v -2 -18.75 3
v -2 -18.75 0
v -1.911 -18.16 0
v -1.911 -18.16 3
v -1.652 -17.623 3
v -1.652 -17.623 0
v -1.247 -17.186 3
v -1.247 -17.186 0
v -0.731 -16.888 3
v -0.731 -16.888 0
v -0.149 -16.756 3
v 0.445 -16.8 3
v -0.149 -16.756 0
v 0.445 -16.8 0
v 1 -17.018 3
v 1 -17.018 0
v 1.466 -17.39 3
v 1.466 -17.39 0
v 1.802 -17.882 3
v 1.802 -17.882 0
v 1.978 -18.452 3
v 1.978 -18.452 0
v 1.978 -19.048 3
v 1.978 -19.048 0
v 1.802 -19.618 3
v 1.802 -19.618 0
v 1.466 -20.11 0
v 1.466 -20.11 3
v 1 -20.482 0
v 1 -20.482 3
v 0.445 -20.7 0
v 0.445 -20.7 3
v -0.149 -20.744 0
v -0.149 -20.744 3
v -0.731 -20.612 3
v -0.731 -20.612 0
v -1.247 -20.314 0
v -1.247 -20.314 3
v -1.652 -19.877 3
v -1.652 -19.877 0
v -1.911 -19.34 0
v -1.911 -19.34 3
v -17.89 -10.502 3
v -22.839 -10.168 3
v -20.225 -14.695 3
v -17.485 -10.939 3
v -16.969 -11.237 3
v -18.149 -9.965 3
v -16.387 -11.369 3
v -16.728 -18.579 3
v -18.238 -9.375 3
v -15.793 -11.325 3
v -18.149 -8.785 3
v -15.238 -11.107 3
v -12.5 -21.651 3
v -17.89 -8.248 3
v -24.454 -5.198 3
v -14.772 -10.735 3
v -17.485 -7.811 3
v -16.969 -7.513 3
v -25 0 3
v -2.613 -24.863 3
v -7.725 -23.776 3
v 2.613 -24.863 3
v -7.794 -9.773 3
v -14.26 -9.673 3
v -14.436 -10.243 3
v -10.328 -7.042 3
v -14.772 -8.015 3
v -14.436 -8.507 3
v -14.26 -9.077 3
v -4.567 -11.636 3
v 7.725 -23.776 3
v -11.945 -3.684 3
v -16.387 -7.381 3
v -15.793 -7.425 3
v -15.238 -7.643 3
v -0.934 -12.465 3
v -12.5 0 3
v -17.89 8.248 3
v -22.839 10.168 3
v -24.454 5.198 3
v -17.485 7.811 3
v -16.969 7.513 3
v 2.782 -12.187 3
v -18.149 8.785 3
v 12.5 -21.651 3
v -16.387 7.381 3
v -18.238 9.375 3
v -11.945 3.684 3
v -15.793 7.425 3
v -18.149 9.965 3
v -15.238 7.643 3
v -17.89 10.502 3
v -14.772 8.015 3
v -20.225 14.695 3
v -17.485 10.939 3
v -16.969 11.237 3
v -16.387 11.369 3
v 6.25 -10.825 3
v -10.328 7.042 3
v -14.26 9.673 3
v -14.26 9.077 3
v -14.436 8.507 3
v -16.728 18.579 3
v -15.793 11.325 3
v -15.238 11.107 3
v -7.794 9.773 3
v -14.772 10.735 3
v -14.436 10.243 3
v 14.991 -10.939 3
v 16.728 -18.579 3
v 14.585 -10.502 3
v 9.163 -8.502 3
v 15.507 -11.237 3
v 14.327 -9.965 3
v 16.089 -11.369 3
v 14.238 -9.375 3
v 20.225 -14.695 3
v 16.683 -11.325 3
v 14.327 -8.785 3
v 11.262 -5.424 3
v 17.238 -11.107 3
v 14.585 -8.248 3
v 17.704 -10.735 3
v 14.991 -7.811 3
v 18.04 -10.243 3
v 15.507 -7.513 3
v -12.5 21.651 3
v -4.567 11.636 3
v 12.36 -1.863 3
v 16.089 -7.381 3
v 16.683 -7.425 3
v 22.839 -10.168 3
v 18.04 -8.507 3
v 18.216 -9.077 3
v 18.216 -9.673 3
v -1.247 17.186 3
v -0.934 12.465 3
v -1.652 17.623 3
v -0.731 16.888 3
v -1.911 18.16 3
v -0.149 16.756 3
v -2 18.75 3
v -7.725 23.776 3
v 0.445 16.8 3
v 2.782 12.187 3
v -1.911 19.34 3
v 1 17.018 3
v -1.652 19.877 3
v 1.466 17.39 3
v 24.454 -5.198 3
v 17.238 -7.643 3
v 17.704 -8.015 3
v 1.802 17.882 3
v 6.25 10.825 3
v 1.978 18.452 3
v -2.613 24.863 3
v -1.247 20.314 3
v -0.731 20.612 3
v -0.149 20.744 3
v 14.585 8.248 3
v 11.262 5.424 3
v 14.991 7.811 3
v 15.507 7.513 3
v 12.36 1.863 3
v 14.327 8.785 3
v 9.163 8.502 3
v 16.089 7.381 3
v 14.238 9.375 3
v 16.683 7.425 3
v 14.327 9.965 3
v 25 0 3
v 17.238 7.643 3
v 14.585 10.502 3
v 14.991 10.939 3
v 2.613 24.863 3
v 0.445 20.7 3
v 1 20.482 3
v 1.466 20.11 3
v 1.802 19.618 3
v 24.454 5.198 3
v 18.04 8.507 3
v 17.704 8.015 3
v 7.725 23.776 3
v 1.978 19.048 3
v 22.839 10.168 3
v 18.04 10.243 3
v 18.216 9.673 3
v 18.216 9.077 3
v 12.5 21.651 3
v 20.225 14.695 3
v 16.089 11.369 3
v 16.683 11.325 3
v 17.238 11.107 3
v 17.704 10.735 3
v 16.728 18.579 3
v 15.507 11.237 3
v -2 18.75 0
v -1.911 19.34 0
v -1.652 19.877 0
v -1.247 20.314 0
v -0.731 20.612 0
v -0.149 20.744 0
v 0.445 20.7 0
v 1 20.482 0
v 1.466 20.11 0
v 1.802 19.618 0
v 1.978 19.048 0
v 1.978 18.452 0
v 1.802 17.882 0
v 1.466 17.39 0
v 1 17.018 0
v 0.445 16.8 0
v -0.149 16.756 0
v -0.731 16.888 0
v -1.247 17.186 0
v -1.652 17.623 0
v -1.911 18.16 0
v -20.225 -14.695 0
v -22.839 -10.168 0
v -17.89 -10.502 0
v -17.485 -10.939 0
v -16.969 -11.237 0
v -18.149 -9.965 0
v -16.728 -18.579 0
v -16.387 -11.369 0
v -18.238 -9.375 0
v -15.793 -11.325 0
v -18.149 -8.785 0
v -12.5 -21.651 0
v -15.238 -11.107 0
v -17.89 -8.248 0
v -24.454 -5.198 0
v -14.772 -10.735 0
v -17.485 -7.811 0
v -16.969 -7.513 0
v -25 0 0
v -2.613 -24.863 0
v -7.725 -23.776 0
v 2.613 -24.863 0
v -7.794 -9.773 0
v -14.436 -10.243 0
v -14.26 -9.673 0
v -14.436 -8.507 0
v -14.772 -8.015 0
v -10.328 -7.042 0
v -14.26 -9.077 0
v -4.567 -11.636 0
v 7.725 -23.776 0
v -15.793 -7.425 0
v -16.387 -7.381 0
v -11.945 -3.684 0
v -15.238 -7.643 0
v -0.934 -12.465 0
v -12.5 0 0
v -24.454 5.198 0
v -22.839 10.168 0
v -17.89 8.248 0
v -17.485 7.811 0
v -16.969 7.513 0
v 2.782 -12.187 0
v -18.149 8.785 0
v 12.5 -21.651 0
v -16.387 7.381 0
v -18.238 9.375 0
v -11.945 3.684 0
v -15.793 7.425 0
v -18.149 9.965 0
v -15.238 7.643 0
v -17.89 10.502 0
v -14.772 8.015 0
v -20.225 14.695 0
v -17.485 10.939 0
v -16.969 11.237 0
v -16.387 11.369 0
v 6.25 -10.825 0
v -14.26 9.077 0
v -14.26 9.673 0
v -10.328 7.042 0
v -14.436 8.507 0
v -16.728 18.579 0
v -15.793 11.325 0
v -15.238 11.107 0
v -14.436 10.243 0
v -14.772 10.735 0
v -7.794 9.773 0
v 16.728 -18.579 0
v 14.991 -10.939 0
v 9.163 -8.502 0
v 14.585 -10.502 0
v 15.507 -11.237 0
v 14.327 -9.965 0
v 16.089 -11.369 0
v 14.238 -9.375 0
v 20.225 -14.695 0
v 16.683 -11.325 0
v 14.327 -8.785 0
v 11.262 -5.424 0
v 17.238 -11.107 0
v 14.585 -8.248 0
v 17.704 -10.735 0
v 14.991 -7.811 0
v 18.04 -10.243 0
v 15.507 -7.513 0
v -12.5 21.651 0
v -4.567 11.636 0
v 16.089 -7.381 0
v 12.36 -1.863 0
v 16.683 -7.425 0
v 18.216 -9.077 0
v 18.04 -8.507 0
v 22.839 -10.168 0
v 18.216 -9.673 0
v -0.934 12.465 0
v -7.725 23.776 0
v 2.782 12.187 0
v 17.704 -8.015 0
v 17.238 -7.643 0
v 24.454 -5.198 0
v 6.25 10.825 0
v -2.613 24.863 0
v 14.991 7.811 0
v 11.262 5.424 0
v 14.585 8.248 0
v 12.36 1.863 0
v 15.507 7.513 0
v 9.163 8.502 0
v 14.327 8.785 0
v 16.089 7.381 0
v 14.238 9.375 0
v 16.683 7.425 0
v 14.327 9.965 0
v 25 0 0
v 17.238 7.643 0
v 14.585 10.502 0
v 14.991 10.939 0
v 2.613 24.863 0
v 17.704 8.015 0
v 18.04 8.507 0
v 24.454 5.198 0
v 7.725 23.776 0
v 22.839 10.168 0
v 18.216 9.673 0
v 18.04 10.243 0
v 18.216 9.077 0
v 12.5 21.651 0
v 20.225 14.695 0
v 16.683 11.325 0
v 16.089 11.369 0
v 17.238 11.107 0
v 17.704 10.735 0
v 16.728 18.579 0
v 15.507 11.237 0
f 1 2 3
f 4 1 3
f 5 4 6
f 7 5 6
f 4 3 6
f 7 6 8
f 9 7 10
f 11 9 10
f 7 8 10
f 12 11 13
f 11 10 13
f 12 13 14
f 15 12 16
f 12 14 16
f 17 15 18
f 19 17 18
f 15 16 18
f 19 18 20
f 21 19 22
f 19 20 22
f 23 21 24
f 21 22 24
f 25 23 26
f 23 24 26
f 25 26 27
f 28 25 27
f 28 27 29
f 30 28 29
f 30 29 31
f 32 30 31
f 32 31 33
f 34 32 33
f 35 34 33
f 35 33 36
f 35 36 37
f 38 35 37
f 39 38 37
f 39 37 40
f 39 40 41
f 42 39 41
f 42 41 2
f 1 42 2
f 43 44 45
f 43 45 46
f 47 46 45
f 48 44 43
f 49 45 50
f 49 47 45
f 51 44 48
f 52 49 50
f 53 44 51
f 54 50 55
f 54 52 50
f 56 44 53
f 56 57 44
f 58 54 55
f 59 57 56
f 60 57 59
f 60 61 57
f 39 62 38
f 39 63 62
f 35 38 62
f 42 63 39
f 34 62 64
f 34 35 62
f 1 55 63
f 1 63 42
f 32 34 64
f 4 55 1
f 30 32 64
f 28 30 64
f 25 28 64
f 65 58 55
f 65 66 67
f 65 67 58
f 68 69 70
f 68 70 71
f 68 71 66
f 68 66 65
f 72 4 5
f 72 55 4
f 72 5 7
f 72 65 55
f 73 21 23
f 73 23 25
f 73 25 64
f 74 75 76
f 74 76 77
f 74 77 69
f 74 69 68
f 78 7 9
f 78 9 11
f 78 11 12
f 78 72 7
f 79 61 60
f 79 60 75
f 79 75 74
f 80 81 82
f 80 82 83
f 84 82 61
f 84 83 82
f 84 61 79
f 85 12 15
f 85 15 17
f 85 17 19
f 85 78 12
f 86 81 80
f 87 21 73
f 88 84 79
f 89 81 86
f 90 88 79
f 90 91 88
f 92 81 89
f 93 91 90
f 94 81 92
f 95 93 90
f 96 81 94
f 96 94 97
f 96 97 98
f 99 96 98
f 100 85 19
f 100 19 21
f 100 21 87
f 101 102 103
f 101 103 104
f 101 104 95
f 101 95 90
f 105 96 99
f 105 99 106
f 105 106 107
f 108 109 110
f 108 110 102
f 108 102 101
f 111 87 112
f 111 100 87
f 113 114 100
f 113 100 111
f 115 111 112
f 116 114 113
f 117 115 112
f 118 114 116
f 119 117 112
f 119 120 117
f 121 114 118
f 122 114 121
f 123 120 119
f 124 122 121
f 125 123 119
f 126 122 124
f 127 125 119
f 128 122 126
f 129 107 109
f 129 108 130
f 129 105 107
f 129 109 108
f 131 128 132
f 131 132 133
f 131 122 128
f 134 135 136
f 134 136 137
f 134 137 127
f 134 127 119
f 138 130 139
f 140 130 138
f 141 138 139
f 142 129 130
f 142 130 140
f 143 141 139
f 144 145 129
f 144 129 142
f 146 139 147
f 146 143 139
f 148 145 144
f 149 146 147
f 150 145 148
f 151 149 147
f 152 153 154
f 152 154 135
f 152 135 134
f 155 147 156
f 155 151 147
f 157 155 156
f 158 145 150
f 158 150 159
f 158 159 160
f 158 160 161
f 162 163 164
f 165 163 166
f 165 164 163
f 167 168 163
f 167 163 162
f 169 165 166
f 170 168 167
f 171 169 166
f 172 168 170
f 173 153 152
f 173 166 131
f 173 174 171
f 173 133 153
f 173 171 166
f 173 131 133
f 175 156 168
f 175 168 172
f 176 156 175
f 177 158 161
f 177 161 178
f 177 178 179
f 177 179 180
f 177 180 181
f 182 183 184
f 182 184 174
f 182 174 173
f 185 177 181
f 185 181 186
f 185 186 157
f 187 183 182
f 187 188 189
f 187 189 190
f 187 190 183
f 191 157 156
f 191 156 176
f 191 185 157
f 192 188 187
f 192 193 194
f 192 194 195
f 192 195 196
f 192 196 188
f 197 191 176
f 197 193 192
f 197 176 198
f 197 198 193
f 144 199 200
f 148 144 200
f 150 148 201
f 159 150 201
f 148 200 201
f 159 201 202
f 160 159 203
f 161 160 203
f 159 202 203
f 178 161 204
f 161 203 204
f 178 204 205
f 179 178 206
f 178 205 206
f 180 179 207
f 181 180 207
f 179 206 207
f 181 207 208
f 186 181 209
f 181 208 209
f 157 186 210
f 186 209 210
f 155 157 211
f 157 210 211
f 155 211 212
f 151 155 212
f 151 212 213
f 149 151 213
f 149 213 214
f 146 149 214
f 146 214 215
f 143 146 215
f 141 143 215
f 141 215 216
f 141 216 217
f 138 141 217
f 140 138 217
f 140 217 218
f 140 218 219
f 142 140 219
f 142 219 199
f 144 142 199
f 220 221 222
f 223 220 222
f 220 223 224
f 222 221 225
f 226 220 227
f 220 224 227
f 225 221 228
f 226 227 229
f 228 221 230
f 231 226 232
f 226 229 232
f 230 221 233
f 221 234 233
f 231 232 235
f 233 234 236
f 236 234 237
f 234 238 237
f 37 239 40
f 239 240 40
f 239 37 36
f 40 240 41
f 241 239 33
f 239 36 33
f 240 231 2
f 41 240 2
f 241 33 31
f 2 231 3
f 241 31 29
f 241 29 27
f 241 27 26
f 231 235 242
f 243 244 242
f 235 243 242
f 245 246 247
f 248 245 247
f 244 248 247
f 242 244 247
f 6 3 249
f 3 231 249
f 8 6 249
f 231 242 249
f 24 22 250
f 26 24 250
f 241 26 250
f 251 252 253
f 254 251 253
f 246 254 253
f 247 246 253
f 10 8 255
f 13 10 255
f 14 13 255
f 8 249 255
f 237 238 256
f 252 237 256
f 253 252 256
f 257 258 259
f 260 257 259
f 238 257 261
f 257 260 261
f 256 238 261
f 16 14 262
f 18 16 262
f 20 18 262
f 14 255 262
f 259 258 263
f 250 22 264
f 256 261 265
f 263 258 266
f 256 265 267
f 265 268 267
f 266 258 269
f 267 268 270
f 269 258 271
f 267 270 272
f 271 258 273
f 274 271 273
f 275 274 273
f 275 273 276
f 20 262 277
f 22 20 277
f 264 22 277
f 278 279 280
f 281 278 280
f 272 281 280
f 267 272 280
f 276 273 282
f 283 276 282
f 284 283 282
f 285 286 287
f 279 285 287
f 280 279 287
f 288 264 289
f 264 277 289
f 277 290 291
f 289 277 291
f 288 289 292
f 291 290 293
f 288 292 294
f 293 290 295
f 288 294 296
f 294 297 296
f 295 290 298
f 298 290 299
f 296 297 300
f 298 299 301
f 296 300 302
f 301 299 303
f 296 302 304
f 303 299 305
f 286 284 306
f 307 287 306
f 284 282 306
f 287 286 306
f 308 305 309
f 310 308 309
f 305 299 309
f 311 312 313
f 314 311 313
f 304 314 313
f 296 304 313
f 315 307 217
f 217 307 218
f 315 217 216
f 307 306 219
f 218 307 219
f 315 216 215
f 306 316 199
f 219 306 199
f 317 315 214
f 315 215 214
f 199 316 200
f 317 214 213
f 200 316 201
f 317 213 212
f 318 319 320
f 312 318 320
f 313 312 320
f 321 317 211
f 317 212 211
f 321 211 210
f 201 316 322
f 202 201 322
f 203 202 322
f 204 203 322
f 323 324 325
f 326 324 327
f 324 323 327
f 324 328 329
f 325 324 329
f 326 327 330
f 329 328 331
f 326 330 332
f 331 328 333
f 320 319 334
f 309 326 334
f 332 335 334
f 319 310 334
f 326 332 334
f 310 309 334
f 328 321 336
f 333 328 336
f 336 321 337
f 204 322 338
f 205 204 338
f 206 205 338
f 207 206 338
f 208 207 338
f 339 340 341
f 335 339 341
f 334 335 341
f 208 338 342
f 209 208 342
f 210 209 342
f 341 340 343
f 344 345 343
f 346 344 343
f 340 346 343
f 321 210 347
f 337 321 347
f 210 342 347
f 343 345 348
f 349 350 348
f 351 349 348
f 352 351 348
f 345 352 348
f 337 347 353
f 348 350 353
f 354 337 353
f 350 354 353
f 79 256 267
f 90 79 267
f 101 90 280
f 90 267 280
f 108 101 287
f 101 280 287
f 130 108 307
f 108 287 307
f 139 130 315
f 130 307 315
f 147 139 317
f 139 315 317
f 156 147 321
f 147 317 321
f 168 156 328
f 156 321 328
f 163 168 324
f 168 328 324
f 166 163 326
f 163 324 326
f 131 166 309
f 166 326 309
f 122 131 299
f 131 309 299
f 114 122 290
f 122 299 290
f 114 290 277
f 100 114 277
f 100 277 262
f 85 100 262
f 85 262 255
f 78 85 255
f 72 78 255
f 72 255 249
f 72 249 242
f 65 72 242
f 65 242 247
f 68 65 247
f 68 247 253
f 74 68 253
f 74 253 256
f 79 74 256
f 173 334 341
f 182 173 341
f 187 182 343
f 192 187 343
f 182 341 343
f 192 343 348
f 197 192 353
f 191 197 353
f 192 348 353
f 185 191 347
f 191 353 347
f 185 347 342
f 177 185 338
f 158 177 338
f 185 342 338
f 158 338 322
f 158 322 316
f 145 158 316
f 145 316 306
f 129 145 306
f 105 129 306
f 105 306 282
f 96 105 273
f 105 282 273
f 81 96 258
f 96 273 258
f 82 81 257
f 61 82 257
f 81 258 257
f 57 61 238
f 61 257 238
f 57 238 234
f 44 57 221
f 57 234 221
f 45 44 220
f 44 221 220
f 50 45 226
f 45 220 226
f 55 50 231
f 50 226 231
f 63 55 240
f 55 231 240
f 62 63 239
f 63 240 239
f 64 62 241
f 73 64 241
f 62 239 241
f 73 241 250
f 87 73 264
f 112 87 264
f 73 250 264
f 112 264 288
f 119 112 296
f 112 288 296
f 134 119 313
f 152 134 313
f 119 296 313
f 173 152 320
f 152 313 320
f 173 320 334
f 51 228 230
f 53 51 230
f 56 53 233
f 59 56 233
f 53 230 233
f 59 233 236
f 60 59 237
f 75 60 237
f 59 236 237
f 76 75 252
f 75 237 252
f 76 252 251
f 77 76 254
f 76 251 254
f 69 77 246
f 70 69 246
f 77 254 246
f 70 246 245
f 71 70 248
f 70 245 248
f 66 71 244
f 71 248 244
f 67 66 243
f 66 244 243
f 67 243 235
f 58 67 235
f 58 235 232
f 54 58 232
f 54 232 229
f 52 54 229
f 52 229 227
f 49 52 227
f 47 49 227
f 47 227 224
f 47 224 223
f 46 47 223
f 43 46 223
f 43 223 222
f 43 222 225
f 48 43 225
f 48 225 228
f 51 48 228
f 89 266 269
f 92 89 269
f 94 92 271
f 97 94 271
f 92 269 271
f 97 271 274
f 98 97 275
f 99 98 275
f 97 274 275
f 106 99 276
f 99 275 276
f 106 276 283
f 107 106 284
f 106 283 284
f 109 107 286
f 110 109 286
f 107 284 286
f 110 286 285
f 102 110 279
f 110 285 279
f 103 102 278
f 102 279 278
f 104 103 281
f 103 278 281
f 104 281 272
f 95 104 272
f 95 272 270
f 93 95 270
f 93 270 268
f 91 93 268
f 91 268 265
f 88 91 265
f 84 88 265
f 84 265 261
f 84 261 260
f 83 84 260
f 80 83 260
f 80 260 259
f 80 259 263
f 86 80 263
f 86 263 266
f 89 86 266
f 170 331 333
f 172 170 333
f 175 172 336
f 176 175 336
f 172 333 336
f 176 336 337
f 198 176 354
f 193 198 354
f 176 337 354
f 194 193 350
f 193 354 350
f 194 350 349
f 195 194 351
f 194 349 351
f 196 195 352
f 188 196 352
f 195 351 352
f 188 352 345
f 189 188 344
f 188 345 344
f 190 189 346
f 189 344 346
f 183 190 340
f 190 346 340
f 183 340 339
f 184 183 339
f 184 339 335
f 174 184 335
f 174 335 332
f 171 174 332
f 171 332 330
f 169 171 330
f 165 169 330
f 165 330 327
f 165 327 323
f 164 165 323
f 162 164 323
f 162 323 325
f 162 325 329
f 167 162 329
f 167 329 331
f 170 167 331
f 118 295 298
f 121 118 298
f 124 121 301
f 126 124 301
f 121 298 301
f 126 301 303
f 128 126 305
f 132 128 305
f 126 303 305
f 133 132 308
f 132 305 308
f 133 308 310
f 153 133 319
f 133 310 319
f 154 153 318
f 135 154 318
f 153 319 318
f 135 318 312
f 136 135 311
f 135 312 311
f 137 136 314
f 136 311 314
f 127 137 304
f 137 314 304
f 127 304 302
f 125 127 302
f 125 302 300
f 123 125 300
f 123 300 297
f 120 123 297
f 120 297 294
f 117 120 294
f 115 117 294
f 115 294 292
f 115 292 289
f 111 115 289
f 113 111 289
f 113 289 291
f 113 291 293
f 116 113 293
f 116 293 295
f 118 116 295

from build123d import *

# Parameters (mm, degrees)
SKETCH1_R           = 25
BOSS_EXTRUDE1_DEPTH = 3
SKETCH4_R           = 12.5
CUT_EXTRUDE1_DEPTH  = 8.2
SKETCH11_R          = 2
CUT_EXTRUDE2_DEPTH  = 10


with BuildPart() as part:
    # Sketch1 → Boss-Extrude1 (new body)
    with BuildSketch(Plane.XY):
        Circle(SKETCH1_R)
    extrude(amount=BOSS_EXTRUDE1_DEPTH)

    # Sketch4 → Cut-Extrude1 (cut)
    with BuildSketch(Plane(origin=(0, 0, 0), x_dir=(-1, 0, 0), z_dir=(0, 0, -1))):
        Circle(SKETCH4_R)
    extrude(amount=-CUT_EXTRUDE1_DEPTH, mode=Mode.SUBTRACT)

    # Sketch11 → Cut-Extrude2 (cut)
    with BuildSketch(Plane(origin=(0, 0, 0), x_dir=(-1, 0, 0), z_dir=(0, 0, -1))):
        with Locations((0, 18.75)):
            Circle(SKETCH11_R)
        with Locations((16.237976321, 9.375)):
            Circle(SKETCH11_R)
        with Locations((16.237976321, -9.375)):
            Circle(SKETCH11_R)
        with Locations((0, -18.75)):
            Circle(SKETCH11_R)
        with Locations((-16.237976321, -9.375)):
            Circle(SKETCH11_R)
        with Locations((-16.237976321, 9.375)):
            Circle(SKETCH11_R)
    extrude(amount=-CUT_EXTRUDE2_DEPTH, mode=Mode.SUBTRACT)


solid = part.part
